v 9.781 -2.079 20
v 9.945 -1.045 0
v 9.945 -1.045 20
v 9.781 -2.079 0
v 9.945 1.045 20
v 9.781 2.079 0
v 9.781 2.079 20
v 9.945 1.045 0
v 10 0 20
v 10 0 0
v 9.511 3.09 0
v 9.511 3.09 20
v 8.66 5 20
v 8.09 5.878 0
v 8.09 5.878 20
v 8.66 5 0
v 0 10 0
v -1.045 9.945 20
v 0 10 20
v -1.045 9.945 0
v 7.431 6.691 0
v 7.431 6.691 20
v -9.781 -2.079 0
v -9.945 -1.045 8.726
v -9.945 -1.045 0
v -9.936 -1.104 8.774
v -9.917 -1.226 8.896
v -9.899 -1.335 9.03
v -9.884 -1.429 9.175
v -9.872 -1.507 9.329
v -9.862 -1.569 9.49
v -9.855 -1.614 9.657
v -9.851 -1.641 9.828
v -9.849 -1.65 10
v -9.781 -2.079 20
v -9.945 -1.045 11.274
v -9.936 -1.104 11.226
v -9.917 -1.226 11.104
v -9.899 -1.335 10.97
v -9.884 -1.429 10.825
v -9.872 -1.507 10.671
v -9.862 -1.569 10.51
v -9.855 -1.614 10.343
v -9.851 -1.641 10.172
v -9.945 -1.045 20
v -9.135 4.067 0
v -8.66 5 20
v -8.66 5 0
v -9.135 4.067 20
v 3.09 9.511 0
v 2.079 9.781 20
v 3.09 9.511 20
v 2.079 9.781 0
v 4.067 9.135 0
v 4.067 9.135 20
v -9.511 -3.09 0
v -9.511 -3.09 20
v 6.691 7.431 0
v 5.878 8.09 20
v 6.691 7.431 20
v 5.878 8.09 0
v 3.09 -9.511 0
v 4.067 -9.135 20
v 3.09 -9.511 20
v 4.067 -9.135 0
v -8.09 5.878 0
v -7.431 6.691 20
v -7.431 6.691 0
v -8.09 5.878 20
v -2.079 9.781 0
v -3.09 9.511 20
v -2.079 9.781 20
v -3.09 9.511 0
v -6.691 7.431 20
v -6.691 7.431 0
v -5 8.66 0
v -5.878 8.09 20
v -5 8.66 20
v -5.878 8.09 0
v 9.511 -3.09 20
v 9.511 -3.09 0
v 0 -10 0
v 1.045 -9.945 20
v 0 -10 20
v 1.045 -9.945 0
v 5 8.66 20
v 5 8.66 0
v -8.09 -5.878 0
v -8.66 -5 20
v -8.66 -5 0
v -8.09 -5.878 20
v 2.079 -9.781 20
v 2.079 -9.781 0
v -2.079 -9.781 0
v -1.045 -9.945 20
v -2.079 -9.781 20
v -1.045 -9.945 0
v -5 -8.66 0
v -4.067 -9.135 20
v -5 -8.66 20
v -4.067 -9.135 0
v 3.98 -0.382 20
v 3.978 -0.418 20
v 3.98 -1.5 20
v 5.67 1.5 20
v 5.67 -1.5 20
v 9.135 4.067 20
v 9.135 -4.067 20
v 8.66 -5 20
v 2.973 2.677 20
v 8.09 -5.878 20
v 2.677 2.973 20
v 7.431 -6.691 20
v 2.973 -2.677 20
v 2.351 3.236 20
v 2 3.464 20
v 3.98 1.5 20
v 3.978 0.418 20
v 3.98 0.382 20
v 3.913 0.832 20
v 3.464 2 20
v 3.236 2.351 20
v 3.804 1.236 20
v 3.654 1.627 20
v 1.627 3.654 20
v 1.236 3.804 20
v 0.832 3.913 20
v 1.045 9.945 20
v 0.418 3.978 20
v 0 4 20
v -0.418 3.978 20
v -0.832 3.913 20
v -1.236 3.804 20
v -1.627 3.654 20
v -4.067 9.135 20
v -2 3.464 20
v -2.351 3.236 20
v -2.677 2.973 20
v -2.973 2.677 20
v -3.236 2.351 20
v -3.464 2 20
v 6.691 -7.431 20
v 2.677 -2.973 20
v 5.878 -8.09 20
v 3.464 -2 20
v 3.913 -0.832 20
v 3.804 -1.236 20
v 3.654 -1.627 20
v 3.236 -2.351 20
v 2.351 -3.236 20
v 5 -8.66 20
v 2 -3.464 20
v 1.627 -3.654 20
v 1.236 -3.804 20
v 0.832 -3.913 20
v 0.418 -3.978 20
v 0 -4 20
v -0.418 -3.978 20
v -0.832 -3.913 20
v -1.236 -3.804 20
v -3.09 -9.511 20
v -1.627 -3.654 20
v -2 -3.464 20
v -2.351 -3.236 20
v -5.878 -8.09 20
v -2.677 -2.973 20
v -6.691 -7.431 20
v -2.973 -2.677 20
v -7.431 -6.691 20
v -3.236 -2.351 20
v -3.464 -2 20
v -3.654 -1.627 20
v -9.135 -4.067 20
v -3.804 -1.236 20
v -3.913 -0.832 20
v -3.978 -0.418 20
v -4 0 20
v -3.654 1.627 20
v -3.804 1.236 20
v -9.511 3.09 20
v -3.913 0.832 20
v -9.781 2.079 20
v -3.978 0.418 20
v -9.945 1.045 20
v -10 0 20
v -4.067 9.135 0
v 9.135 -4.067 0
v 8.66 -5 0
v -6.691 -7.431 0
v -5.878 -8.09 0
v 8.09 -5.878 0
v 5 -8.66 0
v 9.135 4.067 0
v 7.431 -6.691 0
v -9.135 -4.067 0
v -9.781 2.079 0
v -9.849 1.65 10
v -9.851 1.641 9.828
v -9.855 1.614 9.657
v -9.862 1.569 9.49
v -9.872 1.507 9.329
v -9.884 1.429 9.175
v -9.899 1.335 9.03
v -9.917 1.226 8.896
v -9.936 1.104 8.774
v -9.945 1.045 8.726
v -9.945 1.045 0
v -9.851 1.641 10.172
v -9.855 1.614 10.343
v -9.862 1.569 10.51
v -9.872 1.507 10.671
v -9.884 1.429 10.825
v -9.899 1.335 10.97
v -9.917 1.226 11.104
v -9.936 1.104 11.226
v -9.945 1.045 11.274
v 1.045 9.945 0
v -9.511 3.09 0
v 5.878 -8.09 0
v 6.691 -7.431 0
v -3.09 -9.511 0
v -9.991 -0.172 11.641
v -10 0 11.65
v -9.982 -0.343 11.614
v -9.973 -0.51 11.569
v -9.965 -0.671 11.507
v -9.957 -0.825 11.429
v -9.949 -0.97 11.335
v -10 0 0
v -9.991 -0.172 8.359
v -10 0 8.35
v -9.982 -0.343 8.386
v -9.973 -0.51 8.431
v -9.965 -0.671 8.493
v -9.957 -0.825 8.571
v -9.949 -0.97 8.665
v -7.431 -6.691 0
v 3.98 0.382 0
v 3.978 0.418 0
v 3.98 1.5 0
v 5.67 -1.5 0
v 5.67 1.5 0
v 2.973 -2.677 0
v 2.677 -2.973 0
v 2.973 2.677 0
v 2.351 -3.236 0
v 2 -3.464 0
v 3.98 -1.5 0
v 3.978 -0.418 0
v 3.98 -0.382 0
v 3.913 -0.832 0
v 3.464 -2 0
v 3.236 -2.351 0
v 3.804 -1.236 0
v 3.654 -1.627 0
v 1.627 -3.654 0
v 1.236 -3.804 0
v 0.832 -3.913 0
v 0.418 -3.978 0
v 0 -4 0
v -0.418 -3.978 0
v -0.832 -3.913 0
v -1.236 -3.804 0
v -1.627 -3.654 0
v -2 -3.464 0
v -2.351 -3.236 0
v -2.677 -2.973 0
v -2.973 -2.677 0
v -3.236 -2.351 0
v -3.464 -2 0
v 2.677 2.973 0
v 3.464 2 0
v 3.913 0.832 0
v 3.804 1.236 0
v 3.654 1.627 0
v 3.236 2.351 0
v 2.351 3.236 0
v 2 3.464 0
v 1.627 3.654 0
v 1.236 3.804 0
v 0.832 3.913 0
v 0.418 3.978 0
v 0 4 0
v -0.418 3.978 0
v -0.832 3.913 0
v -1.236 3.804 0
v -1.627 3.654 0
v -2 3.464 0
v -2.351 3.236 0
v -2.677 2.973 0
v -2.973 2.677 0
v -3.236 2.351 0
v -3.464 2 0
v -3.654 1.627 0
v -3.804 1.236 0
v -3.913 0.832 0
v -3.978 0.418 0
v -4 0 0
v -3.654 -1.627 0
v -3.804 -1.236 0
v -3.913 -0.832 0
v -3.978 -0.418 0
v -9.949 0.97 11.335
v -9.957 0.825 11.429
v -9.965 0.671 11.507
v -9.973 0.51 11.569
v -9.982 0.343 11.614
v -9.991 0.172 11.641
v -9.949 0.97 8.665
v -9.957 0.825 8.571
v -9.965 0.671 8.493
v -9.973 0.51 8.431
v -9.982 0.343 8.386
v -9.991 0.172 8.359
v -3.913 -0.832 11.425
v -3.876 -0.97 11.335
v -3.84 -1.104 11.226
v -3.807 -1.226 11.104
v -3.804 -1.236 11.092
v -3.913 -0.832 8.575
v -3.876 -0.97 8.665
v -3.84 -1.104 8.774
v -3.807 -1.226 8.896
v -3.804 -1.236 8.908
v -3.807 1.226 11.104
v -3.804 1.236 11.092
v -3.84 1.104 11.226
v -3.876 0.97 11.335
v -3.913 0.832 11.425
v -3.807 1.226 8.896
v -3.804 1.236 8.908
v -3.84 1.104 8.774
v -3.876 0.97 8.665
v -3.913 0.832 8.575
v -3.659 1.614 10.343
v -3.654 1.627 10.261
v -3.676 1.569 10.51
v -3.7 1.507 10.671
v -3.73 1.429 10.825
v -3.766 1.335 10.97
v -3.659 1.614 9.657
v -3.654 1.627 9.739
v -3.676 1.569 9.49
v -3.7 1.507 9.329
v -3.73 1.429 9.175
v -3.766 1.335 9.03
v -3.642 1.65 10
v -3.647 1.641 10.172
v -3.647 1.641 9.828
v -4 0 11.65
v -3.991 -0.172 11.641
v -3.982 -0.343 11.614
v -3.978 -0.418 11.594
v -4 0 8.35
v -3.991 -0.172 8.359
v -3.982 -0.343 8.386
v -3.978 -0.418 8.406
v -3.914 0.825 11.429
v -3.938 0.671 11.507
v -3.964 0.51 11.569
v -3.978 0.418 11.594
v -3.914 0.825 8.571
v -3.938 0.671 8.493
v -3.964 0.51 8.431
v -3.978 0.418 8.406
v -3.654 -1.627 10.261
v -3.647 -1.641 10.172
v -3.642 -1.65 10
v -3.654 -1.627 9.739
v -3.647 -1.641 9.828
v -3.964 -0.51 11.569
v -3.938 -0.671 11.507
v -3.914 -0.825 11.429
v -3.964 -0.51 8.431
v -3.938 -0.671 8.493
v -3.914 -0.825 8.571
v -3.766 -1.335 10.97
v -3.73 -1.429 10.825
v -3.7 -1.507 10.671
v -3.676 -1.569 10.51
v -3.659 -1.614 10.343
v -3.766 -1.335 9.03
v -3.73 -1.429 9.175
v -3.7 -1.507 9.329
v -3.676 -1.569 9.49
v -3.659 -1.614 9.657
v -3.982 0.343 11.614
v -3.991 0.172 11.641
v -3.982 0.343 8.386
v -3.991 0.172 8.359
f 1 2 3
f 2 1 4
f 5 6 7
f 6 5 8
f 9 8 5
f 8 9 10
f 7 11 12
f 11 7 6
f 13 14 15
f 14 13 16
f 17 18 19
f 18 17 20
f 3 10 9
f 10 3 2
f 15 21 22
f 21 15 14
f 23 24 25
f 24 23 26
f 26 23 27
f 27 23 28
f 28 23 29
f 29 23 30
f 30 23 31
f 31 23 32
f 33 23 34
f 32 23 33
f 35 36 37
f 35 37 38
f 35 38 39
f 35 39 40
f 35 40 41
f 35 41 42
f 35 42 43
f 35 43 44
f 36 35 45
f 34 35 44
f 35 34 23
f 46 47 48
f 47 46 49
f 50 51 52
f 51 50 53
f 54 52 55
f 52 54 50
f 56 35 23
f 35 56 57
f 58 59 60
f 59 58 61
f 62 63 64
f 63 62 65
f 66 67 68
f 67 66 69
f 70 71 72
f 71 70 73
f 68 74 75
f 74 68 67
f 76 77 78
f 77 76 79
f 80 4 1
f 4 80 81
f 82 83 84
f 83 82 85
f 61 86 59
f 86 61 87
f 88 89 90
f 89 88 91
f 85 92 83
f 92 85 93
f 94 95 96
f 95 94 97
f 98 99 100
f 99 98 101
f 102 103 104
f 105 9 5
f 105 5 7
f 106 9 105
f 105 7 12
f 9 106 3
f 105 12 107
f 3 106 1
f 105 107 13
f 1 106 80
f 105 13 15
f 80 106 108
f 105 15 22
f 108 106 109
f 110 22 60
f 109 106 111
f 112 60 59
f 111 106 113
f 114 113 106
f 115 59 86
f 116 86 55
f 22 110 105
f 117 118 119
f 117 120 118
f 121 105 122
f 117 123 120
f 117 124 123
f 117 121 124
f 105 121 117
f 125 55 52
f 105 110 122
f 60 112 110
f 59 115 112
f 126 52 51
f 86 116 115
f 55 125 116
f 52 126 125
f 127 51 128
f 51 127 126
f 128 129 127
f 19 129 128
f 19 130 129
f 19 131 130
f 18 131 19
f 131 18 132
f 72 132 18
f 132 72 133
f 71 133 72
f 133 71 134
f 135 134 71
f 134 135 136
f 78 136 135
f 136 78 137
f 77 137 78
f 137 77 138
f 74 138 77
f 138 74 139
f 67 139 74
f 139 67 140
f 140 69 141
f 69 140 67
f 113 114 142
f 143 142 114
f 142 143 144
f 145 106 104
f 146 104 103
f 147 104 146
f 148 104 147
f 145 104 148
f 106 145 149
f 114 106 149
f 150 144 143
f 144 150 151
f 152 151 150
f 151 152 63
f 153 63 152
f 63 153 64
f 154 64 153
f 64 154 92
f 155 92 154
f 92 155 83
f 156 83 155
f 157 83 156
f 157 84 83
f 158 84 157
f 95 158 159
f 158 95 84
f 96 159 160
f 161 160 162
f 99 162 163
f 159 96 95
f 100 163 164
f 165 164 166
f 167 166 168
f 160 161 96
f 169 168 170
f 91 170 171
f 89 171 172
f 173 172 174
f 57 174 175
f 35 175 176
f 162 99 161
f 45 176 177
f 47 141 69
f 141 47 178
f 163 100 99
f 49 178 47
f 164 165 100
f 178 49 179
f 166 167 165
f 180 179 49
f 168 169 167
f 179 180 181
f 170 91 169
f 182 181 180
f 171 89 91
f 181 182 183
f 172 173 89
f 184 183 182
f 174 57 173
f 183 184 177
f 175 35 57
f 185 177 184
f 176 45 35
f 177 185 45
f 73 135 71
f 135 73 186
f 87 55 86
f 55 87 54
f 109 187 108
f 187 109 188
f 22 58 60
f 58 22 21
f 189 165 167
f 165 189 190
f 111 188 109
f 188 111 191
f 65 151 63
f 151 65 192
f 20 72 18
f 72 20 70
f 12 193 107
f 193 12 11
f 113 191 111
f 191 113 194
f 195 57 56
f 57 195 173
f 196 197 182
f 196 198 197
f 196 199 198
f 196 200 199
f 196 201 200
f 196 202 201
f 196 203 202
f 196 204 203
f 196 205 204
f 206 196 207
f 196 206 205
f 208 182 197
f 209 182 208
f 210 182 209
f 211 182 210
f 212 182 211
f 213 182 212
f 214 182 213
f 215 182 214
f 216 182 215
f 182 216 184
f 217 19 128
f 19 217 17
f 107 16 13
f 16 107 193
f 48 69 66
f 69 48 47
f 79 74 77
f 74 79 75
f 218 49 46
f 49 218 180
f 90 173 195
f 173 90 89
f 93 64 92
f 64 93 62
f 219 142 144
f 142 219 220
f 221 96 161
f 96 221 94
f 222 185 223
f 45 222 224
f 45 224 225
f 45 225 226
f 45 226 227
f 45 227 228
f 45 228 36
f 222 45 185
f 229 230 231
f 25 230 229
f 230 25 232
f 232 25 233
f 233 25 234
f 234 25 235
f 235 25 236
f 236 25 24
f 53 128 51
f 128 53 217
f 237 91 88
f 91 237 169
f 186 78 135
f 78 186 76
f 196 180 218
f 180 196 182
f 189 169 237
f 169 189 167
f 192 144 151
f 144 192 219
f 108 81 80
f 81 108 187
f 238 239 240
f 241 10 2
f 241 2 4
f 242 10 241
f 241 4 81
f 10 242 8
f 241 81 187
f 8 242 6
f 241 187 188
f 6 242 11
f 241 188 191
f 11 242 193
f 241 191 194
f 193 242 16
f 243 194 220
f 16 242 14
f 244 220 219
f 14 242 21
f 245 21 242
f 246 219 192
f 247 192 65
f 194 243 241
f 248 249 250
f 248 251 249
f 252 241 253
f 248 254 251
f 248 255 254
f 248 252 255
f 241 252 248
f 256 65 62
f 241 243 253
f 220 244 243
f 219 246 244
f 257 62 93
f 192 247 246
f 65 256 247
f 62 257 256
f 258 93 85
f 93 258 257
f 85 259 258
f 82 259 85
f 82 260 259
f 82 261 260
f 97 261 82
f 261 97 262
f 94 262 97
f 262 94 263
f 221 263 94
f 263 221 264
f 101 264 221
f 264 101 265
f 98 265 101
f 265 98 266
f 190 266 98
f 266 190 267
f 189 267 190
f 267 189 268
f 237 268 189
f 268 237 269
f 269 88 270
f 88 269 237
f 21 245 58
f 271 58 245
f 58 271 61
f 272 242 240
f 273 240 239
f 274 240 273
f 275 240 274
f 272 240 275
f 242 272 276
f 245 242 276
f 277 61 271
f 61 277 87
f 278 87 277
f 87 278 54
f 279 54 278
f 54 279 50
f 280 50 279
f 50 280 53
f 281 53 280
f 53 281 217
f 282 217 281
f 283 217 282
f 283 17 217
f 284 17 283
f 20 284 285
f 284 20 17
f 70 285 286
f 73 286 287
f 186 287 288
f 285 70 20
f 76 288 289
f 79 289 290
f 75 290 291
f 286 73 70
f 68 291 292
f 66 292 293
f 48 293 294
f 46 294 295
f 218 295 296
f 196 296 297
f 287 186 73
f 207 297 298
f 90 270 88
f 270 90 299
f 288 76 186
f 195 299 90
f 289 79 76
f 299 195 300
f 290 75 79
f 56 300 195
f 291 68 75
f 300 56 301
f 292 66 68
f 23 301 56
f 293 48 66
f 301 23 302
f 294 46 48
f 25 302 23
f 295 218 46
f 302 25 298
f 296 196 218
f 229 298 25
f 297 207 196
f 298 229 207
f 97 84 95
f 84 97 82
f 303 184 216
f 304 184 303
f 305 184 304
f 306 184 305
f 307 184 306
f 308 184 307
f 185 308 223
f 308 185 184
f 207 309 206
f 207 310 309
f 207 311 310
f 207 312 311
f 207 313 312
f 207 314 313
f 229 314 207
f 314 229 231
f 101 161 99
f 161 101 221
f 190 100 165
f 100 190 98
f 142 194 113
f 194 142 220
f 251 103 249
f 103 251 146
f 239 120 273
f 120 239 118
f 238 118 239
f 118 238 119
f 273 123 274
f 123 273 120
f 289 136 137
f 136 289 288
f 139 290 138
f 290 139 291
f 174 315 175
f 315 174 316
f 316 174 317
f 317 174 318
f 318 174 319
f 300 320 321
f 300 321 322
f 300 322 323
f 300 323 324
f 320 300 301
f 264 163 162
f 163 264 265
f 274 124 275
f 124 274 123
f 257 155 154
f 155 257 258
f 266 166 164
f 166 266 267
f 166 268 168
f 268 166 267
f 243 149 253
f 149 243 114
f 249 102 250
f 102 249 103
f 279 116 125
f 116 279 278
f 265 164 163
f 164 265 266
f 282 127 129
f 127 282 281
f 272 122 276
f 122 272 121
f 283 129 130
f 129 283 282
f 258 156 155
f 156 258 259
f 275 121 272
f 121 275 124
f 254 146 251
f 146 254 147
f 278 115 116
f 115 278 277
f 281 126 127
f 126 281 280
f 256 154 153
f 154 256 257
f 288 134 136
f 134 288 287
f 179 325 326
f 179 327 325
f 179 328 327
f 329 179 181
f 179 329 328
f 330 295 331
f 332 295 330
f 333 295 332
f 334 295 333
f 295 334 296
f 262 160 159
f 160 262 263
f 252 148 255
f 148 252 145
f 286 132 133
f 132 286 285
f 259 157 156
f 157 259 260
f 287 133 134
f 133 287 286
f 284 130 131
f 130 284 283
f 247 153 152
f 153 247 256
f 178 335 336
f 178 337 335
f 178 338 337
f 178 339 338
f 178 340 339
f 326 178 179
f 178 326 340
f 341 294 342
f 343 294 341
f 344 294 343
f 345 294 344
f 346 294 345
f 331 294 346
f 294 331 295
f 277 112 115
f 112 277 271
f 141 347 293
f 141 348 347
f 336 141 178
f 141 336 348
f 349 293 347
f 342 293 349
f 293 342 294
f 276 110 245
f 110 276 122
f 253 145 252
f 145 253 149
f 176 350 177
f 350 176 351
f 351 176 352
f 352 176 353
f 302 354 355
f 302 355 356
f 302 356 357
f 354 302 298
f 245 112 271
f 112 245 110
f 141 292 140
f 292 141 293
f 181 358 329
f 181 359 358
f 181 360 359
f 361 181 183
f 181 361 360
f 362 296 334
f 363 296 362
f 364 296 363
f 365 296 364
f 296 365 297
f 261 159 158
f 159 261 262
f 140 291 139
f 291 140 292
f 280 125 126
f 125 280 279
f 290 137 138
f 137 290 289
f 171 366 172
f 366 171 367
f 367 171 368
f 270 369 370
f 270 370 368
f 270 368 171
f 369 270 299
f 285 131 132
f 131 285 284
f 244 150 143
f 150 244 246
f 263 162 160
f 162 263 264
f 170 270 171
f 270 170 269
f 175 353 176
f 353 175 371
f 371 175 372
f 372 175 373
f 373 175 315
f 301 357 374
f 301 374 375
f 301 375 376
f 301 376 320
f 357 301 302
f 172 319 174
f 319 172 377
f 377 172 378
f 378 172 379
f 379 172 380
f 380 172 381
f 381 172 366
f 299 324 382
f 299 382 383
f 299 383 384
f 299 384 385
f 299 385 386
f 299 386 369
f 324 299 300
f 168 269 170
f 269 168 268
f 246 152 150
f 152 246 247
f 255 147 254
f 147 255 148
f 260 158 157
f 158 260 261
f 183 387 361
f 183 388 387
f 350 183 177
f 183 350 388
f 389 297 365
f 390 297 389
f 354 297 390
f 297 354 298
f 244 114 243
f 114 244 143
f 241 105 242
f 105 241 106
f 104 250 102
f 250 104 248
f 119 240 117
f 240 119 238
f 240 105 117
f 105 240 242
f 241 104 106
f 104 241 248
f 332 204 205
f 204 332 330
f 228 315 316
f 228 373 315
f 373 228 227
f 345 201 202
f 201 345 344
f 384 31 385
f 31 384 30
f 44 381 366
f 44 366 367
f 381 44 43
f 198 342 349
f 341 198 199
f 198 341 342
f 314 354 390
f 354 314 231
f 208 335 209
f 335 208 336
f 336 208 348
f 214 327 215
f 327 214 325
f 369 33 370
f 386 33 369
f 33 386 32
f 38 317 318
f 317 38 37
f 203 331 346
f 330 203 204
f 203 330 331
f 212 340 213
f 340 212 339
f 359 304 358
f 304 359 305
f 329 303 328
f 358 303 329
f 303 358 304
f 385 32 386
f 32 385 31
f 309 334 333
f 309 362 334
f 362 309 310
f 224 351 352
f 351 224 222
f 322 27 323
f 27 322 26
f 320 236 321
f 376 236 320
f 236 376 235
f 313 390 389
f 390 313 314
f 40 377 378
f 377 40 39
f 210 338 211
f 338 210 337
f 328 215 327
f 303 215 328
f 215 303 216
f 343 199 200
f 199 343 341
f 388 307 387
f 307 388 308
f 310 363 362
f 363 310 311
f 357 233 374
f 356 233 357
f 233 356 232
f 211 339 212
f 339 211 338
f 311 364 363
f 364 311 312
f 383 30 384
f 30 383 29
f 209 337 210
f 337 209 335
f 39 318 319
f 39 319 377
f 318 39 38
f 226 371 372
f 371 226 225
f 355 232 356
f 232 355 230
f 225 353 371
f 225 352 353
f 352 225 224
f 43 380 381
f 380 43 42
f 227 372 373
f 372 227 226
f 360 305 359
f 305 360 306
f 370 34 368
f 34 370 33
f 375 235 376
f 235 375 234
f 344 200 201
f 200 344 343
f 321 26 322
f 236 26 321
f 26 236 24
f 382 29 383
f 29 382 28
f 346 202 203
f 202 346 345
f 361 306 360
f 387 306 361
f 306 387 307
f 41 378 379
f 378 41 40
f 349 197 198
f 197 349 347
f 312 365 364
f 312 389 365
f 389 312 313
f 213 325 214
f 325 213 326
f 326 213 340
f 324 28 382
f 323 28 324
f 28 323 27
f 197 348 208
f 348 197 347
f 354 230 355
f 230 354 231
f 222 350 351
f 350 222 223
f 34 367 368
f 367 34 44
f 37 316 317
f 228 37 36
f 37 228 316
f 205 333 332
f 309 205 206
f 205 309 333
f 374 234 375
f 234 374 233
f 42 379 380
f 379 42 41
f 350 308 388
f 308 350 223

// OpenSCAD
// Keyway hub for a 8 mm shaft.
$fn = 60;
eps = 0.02;
shaft_d = 8;
outer_d = 20;
length = 20;
key_w = 3;
key_depth = 1.6500000000000001;
difference() {
    cylinder(d = outer_d, h = length);
    translate([0, 0, -eps]) cylinder(d = shaft_d, h = length + 2 * eps);
    translate([shaft_d / 2 - eps, -key_w / 2, -eps]) cube([key_depth + 2 * eps, key_w, length + 2 * eps]);
    translate([-outer_d / 2 - eps, 0, length / 2]) rotate([0, 90, 0]) cylinder(d = 3.3, h = outer_d / 2 + 2 * eps);
}
